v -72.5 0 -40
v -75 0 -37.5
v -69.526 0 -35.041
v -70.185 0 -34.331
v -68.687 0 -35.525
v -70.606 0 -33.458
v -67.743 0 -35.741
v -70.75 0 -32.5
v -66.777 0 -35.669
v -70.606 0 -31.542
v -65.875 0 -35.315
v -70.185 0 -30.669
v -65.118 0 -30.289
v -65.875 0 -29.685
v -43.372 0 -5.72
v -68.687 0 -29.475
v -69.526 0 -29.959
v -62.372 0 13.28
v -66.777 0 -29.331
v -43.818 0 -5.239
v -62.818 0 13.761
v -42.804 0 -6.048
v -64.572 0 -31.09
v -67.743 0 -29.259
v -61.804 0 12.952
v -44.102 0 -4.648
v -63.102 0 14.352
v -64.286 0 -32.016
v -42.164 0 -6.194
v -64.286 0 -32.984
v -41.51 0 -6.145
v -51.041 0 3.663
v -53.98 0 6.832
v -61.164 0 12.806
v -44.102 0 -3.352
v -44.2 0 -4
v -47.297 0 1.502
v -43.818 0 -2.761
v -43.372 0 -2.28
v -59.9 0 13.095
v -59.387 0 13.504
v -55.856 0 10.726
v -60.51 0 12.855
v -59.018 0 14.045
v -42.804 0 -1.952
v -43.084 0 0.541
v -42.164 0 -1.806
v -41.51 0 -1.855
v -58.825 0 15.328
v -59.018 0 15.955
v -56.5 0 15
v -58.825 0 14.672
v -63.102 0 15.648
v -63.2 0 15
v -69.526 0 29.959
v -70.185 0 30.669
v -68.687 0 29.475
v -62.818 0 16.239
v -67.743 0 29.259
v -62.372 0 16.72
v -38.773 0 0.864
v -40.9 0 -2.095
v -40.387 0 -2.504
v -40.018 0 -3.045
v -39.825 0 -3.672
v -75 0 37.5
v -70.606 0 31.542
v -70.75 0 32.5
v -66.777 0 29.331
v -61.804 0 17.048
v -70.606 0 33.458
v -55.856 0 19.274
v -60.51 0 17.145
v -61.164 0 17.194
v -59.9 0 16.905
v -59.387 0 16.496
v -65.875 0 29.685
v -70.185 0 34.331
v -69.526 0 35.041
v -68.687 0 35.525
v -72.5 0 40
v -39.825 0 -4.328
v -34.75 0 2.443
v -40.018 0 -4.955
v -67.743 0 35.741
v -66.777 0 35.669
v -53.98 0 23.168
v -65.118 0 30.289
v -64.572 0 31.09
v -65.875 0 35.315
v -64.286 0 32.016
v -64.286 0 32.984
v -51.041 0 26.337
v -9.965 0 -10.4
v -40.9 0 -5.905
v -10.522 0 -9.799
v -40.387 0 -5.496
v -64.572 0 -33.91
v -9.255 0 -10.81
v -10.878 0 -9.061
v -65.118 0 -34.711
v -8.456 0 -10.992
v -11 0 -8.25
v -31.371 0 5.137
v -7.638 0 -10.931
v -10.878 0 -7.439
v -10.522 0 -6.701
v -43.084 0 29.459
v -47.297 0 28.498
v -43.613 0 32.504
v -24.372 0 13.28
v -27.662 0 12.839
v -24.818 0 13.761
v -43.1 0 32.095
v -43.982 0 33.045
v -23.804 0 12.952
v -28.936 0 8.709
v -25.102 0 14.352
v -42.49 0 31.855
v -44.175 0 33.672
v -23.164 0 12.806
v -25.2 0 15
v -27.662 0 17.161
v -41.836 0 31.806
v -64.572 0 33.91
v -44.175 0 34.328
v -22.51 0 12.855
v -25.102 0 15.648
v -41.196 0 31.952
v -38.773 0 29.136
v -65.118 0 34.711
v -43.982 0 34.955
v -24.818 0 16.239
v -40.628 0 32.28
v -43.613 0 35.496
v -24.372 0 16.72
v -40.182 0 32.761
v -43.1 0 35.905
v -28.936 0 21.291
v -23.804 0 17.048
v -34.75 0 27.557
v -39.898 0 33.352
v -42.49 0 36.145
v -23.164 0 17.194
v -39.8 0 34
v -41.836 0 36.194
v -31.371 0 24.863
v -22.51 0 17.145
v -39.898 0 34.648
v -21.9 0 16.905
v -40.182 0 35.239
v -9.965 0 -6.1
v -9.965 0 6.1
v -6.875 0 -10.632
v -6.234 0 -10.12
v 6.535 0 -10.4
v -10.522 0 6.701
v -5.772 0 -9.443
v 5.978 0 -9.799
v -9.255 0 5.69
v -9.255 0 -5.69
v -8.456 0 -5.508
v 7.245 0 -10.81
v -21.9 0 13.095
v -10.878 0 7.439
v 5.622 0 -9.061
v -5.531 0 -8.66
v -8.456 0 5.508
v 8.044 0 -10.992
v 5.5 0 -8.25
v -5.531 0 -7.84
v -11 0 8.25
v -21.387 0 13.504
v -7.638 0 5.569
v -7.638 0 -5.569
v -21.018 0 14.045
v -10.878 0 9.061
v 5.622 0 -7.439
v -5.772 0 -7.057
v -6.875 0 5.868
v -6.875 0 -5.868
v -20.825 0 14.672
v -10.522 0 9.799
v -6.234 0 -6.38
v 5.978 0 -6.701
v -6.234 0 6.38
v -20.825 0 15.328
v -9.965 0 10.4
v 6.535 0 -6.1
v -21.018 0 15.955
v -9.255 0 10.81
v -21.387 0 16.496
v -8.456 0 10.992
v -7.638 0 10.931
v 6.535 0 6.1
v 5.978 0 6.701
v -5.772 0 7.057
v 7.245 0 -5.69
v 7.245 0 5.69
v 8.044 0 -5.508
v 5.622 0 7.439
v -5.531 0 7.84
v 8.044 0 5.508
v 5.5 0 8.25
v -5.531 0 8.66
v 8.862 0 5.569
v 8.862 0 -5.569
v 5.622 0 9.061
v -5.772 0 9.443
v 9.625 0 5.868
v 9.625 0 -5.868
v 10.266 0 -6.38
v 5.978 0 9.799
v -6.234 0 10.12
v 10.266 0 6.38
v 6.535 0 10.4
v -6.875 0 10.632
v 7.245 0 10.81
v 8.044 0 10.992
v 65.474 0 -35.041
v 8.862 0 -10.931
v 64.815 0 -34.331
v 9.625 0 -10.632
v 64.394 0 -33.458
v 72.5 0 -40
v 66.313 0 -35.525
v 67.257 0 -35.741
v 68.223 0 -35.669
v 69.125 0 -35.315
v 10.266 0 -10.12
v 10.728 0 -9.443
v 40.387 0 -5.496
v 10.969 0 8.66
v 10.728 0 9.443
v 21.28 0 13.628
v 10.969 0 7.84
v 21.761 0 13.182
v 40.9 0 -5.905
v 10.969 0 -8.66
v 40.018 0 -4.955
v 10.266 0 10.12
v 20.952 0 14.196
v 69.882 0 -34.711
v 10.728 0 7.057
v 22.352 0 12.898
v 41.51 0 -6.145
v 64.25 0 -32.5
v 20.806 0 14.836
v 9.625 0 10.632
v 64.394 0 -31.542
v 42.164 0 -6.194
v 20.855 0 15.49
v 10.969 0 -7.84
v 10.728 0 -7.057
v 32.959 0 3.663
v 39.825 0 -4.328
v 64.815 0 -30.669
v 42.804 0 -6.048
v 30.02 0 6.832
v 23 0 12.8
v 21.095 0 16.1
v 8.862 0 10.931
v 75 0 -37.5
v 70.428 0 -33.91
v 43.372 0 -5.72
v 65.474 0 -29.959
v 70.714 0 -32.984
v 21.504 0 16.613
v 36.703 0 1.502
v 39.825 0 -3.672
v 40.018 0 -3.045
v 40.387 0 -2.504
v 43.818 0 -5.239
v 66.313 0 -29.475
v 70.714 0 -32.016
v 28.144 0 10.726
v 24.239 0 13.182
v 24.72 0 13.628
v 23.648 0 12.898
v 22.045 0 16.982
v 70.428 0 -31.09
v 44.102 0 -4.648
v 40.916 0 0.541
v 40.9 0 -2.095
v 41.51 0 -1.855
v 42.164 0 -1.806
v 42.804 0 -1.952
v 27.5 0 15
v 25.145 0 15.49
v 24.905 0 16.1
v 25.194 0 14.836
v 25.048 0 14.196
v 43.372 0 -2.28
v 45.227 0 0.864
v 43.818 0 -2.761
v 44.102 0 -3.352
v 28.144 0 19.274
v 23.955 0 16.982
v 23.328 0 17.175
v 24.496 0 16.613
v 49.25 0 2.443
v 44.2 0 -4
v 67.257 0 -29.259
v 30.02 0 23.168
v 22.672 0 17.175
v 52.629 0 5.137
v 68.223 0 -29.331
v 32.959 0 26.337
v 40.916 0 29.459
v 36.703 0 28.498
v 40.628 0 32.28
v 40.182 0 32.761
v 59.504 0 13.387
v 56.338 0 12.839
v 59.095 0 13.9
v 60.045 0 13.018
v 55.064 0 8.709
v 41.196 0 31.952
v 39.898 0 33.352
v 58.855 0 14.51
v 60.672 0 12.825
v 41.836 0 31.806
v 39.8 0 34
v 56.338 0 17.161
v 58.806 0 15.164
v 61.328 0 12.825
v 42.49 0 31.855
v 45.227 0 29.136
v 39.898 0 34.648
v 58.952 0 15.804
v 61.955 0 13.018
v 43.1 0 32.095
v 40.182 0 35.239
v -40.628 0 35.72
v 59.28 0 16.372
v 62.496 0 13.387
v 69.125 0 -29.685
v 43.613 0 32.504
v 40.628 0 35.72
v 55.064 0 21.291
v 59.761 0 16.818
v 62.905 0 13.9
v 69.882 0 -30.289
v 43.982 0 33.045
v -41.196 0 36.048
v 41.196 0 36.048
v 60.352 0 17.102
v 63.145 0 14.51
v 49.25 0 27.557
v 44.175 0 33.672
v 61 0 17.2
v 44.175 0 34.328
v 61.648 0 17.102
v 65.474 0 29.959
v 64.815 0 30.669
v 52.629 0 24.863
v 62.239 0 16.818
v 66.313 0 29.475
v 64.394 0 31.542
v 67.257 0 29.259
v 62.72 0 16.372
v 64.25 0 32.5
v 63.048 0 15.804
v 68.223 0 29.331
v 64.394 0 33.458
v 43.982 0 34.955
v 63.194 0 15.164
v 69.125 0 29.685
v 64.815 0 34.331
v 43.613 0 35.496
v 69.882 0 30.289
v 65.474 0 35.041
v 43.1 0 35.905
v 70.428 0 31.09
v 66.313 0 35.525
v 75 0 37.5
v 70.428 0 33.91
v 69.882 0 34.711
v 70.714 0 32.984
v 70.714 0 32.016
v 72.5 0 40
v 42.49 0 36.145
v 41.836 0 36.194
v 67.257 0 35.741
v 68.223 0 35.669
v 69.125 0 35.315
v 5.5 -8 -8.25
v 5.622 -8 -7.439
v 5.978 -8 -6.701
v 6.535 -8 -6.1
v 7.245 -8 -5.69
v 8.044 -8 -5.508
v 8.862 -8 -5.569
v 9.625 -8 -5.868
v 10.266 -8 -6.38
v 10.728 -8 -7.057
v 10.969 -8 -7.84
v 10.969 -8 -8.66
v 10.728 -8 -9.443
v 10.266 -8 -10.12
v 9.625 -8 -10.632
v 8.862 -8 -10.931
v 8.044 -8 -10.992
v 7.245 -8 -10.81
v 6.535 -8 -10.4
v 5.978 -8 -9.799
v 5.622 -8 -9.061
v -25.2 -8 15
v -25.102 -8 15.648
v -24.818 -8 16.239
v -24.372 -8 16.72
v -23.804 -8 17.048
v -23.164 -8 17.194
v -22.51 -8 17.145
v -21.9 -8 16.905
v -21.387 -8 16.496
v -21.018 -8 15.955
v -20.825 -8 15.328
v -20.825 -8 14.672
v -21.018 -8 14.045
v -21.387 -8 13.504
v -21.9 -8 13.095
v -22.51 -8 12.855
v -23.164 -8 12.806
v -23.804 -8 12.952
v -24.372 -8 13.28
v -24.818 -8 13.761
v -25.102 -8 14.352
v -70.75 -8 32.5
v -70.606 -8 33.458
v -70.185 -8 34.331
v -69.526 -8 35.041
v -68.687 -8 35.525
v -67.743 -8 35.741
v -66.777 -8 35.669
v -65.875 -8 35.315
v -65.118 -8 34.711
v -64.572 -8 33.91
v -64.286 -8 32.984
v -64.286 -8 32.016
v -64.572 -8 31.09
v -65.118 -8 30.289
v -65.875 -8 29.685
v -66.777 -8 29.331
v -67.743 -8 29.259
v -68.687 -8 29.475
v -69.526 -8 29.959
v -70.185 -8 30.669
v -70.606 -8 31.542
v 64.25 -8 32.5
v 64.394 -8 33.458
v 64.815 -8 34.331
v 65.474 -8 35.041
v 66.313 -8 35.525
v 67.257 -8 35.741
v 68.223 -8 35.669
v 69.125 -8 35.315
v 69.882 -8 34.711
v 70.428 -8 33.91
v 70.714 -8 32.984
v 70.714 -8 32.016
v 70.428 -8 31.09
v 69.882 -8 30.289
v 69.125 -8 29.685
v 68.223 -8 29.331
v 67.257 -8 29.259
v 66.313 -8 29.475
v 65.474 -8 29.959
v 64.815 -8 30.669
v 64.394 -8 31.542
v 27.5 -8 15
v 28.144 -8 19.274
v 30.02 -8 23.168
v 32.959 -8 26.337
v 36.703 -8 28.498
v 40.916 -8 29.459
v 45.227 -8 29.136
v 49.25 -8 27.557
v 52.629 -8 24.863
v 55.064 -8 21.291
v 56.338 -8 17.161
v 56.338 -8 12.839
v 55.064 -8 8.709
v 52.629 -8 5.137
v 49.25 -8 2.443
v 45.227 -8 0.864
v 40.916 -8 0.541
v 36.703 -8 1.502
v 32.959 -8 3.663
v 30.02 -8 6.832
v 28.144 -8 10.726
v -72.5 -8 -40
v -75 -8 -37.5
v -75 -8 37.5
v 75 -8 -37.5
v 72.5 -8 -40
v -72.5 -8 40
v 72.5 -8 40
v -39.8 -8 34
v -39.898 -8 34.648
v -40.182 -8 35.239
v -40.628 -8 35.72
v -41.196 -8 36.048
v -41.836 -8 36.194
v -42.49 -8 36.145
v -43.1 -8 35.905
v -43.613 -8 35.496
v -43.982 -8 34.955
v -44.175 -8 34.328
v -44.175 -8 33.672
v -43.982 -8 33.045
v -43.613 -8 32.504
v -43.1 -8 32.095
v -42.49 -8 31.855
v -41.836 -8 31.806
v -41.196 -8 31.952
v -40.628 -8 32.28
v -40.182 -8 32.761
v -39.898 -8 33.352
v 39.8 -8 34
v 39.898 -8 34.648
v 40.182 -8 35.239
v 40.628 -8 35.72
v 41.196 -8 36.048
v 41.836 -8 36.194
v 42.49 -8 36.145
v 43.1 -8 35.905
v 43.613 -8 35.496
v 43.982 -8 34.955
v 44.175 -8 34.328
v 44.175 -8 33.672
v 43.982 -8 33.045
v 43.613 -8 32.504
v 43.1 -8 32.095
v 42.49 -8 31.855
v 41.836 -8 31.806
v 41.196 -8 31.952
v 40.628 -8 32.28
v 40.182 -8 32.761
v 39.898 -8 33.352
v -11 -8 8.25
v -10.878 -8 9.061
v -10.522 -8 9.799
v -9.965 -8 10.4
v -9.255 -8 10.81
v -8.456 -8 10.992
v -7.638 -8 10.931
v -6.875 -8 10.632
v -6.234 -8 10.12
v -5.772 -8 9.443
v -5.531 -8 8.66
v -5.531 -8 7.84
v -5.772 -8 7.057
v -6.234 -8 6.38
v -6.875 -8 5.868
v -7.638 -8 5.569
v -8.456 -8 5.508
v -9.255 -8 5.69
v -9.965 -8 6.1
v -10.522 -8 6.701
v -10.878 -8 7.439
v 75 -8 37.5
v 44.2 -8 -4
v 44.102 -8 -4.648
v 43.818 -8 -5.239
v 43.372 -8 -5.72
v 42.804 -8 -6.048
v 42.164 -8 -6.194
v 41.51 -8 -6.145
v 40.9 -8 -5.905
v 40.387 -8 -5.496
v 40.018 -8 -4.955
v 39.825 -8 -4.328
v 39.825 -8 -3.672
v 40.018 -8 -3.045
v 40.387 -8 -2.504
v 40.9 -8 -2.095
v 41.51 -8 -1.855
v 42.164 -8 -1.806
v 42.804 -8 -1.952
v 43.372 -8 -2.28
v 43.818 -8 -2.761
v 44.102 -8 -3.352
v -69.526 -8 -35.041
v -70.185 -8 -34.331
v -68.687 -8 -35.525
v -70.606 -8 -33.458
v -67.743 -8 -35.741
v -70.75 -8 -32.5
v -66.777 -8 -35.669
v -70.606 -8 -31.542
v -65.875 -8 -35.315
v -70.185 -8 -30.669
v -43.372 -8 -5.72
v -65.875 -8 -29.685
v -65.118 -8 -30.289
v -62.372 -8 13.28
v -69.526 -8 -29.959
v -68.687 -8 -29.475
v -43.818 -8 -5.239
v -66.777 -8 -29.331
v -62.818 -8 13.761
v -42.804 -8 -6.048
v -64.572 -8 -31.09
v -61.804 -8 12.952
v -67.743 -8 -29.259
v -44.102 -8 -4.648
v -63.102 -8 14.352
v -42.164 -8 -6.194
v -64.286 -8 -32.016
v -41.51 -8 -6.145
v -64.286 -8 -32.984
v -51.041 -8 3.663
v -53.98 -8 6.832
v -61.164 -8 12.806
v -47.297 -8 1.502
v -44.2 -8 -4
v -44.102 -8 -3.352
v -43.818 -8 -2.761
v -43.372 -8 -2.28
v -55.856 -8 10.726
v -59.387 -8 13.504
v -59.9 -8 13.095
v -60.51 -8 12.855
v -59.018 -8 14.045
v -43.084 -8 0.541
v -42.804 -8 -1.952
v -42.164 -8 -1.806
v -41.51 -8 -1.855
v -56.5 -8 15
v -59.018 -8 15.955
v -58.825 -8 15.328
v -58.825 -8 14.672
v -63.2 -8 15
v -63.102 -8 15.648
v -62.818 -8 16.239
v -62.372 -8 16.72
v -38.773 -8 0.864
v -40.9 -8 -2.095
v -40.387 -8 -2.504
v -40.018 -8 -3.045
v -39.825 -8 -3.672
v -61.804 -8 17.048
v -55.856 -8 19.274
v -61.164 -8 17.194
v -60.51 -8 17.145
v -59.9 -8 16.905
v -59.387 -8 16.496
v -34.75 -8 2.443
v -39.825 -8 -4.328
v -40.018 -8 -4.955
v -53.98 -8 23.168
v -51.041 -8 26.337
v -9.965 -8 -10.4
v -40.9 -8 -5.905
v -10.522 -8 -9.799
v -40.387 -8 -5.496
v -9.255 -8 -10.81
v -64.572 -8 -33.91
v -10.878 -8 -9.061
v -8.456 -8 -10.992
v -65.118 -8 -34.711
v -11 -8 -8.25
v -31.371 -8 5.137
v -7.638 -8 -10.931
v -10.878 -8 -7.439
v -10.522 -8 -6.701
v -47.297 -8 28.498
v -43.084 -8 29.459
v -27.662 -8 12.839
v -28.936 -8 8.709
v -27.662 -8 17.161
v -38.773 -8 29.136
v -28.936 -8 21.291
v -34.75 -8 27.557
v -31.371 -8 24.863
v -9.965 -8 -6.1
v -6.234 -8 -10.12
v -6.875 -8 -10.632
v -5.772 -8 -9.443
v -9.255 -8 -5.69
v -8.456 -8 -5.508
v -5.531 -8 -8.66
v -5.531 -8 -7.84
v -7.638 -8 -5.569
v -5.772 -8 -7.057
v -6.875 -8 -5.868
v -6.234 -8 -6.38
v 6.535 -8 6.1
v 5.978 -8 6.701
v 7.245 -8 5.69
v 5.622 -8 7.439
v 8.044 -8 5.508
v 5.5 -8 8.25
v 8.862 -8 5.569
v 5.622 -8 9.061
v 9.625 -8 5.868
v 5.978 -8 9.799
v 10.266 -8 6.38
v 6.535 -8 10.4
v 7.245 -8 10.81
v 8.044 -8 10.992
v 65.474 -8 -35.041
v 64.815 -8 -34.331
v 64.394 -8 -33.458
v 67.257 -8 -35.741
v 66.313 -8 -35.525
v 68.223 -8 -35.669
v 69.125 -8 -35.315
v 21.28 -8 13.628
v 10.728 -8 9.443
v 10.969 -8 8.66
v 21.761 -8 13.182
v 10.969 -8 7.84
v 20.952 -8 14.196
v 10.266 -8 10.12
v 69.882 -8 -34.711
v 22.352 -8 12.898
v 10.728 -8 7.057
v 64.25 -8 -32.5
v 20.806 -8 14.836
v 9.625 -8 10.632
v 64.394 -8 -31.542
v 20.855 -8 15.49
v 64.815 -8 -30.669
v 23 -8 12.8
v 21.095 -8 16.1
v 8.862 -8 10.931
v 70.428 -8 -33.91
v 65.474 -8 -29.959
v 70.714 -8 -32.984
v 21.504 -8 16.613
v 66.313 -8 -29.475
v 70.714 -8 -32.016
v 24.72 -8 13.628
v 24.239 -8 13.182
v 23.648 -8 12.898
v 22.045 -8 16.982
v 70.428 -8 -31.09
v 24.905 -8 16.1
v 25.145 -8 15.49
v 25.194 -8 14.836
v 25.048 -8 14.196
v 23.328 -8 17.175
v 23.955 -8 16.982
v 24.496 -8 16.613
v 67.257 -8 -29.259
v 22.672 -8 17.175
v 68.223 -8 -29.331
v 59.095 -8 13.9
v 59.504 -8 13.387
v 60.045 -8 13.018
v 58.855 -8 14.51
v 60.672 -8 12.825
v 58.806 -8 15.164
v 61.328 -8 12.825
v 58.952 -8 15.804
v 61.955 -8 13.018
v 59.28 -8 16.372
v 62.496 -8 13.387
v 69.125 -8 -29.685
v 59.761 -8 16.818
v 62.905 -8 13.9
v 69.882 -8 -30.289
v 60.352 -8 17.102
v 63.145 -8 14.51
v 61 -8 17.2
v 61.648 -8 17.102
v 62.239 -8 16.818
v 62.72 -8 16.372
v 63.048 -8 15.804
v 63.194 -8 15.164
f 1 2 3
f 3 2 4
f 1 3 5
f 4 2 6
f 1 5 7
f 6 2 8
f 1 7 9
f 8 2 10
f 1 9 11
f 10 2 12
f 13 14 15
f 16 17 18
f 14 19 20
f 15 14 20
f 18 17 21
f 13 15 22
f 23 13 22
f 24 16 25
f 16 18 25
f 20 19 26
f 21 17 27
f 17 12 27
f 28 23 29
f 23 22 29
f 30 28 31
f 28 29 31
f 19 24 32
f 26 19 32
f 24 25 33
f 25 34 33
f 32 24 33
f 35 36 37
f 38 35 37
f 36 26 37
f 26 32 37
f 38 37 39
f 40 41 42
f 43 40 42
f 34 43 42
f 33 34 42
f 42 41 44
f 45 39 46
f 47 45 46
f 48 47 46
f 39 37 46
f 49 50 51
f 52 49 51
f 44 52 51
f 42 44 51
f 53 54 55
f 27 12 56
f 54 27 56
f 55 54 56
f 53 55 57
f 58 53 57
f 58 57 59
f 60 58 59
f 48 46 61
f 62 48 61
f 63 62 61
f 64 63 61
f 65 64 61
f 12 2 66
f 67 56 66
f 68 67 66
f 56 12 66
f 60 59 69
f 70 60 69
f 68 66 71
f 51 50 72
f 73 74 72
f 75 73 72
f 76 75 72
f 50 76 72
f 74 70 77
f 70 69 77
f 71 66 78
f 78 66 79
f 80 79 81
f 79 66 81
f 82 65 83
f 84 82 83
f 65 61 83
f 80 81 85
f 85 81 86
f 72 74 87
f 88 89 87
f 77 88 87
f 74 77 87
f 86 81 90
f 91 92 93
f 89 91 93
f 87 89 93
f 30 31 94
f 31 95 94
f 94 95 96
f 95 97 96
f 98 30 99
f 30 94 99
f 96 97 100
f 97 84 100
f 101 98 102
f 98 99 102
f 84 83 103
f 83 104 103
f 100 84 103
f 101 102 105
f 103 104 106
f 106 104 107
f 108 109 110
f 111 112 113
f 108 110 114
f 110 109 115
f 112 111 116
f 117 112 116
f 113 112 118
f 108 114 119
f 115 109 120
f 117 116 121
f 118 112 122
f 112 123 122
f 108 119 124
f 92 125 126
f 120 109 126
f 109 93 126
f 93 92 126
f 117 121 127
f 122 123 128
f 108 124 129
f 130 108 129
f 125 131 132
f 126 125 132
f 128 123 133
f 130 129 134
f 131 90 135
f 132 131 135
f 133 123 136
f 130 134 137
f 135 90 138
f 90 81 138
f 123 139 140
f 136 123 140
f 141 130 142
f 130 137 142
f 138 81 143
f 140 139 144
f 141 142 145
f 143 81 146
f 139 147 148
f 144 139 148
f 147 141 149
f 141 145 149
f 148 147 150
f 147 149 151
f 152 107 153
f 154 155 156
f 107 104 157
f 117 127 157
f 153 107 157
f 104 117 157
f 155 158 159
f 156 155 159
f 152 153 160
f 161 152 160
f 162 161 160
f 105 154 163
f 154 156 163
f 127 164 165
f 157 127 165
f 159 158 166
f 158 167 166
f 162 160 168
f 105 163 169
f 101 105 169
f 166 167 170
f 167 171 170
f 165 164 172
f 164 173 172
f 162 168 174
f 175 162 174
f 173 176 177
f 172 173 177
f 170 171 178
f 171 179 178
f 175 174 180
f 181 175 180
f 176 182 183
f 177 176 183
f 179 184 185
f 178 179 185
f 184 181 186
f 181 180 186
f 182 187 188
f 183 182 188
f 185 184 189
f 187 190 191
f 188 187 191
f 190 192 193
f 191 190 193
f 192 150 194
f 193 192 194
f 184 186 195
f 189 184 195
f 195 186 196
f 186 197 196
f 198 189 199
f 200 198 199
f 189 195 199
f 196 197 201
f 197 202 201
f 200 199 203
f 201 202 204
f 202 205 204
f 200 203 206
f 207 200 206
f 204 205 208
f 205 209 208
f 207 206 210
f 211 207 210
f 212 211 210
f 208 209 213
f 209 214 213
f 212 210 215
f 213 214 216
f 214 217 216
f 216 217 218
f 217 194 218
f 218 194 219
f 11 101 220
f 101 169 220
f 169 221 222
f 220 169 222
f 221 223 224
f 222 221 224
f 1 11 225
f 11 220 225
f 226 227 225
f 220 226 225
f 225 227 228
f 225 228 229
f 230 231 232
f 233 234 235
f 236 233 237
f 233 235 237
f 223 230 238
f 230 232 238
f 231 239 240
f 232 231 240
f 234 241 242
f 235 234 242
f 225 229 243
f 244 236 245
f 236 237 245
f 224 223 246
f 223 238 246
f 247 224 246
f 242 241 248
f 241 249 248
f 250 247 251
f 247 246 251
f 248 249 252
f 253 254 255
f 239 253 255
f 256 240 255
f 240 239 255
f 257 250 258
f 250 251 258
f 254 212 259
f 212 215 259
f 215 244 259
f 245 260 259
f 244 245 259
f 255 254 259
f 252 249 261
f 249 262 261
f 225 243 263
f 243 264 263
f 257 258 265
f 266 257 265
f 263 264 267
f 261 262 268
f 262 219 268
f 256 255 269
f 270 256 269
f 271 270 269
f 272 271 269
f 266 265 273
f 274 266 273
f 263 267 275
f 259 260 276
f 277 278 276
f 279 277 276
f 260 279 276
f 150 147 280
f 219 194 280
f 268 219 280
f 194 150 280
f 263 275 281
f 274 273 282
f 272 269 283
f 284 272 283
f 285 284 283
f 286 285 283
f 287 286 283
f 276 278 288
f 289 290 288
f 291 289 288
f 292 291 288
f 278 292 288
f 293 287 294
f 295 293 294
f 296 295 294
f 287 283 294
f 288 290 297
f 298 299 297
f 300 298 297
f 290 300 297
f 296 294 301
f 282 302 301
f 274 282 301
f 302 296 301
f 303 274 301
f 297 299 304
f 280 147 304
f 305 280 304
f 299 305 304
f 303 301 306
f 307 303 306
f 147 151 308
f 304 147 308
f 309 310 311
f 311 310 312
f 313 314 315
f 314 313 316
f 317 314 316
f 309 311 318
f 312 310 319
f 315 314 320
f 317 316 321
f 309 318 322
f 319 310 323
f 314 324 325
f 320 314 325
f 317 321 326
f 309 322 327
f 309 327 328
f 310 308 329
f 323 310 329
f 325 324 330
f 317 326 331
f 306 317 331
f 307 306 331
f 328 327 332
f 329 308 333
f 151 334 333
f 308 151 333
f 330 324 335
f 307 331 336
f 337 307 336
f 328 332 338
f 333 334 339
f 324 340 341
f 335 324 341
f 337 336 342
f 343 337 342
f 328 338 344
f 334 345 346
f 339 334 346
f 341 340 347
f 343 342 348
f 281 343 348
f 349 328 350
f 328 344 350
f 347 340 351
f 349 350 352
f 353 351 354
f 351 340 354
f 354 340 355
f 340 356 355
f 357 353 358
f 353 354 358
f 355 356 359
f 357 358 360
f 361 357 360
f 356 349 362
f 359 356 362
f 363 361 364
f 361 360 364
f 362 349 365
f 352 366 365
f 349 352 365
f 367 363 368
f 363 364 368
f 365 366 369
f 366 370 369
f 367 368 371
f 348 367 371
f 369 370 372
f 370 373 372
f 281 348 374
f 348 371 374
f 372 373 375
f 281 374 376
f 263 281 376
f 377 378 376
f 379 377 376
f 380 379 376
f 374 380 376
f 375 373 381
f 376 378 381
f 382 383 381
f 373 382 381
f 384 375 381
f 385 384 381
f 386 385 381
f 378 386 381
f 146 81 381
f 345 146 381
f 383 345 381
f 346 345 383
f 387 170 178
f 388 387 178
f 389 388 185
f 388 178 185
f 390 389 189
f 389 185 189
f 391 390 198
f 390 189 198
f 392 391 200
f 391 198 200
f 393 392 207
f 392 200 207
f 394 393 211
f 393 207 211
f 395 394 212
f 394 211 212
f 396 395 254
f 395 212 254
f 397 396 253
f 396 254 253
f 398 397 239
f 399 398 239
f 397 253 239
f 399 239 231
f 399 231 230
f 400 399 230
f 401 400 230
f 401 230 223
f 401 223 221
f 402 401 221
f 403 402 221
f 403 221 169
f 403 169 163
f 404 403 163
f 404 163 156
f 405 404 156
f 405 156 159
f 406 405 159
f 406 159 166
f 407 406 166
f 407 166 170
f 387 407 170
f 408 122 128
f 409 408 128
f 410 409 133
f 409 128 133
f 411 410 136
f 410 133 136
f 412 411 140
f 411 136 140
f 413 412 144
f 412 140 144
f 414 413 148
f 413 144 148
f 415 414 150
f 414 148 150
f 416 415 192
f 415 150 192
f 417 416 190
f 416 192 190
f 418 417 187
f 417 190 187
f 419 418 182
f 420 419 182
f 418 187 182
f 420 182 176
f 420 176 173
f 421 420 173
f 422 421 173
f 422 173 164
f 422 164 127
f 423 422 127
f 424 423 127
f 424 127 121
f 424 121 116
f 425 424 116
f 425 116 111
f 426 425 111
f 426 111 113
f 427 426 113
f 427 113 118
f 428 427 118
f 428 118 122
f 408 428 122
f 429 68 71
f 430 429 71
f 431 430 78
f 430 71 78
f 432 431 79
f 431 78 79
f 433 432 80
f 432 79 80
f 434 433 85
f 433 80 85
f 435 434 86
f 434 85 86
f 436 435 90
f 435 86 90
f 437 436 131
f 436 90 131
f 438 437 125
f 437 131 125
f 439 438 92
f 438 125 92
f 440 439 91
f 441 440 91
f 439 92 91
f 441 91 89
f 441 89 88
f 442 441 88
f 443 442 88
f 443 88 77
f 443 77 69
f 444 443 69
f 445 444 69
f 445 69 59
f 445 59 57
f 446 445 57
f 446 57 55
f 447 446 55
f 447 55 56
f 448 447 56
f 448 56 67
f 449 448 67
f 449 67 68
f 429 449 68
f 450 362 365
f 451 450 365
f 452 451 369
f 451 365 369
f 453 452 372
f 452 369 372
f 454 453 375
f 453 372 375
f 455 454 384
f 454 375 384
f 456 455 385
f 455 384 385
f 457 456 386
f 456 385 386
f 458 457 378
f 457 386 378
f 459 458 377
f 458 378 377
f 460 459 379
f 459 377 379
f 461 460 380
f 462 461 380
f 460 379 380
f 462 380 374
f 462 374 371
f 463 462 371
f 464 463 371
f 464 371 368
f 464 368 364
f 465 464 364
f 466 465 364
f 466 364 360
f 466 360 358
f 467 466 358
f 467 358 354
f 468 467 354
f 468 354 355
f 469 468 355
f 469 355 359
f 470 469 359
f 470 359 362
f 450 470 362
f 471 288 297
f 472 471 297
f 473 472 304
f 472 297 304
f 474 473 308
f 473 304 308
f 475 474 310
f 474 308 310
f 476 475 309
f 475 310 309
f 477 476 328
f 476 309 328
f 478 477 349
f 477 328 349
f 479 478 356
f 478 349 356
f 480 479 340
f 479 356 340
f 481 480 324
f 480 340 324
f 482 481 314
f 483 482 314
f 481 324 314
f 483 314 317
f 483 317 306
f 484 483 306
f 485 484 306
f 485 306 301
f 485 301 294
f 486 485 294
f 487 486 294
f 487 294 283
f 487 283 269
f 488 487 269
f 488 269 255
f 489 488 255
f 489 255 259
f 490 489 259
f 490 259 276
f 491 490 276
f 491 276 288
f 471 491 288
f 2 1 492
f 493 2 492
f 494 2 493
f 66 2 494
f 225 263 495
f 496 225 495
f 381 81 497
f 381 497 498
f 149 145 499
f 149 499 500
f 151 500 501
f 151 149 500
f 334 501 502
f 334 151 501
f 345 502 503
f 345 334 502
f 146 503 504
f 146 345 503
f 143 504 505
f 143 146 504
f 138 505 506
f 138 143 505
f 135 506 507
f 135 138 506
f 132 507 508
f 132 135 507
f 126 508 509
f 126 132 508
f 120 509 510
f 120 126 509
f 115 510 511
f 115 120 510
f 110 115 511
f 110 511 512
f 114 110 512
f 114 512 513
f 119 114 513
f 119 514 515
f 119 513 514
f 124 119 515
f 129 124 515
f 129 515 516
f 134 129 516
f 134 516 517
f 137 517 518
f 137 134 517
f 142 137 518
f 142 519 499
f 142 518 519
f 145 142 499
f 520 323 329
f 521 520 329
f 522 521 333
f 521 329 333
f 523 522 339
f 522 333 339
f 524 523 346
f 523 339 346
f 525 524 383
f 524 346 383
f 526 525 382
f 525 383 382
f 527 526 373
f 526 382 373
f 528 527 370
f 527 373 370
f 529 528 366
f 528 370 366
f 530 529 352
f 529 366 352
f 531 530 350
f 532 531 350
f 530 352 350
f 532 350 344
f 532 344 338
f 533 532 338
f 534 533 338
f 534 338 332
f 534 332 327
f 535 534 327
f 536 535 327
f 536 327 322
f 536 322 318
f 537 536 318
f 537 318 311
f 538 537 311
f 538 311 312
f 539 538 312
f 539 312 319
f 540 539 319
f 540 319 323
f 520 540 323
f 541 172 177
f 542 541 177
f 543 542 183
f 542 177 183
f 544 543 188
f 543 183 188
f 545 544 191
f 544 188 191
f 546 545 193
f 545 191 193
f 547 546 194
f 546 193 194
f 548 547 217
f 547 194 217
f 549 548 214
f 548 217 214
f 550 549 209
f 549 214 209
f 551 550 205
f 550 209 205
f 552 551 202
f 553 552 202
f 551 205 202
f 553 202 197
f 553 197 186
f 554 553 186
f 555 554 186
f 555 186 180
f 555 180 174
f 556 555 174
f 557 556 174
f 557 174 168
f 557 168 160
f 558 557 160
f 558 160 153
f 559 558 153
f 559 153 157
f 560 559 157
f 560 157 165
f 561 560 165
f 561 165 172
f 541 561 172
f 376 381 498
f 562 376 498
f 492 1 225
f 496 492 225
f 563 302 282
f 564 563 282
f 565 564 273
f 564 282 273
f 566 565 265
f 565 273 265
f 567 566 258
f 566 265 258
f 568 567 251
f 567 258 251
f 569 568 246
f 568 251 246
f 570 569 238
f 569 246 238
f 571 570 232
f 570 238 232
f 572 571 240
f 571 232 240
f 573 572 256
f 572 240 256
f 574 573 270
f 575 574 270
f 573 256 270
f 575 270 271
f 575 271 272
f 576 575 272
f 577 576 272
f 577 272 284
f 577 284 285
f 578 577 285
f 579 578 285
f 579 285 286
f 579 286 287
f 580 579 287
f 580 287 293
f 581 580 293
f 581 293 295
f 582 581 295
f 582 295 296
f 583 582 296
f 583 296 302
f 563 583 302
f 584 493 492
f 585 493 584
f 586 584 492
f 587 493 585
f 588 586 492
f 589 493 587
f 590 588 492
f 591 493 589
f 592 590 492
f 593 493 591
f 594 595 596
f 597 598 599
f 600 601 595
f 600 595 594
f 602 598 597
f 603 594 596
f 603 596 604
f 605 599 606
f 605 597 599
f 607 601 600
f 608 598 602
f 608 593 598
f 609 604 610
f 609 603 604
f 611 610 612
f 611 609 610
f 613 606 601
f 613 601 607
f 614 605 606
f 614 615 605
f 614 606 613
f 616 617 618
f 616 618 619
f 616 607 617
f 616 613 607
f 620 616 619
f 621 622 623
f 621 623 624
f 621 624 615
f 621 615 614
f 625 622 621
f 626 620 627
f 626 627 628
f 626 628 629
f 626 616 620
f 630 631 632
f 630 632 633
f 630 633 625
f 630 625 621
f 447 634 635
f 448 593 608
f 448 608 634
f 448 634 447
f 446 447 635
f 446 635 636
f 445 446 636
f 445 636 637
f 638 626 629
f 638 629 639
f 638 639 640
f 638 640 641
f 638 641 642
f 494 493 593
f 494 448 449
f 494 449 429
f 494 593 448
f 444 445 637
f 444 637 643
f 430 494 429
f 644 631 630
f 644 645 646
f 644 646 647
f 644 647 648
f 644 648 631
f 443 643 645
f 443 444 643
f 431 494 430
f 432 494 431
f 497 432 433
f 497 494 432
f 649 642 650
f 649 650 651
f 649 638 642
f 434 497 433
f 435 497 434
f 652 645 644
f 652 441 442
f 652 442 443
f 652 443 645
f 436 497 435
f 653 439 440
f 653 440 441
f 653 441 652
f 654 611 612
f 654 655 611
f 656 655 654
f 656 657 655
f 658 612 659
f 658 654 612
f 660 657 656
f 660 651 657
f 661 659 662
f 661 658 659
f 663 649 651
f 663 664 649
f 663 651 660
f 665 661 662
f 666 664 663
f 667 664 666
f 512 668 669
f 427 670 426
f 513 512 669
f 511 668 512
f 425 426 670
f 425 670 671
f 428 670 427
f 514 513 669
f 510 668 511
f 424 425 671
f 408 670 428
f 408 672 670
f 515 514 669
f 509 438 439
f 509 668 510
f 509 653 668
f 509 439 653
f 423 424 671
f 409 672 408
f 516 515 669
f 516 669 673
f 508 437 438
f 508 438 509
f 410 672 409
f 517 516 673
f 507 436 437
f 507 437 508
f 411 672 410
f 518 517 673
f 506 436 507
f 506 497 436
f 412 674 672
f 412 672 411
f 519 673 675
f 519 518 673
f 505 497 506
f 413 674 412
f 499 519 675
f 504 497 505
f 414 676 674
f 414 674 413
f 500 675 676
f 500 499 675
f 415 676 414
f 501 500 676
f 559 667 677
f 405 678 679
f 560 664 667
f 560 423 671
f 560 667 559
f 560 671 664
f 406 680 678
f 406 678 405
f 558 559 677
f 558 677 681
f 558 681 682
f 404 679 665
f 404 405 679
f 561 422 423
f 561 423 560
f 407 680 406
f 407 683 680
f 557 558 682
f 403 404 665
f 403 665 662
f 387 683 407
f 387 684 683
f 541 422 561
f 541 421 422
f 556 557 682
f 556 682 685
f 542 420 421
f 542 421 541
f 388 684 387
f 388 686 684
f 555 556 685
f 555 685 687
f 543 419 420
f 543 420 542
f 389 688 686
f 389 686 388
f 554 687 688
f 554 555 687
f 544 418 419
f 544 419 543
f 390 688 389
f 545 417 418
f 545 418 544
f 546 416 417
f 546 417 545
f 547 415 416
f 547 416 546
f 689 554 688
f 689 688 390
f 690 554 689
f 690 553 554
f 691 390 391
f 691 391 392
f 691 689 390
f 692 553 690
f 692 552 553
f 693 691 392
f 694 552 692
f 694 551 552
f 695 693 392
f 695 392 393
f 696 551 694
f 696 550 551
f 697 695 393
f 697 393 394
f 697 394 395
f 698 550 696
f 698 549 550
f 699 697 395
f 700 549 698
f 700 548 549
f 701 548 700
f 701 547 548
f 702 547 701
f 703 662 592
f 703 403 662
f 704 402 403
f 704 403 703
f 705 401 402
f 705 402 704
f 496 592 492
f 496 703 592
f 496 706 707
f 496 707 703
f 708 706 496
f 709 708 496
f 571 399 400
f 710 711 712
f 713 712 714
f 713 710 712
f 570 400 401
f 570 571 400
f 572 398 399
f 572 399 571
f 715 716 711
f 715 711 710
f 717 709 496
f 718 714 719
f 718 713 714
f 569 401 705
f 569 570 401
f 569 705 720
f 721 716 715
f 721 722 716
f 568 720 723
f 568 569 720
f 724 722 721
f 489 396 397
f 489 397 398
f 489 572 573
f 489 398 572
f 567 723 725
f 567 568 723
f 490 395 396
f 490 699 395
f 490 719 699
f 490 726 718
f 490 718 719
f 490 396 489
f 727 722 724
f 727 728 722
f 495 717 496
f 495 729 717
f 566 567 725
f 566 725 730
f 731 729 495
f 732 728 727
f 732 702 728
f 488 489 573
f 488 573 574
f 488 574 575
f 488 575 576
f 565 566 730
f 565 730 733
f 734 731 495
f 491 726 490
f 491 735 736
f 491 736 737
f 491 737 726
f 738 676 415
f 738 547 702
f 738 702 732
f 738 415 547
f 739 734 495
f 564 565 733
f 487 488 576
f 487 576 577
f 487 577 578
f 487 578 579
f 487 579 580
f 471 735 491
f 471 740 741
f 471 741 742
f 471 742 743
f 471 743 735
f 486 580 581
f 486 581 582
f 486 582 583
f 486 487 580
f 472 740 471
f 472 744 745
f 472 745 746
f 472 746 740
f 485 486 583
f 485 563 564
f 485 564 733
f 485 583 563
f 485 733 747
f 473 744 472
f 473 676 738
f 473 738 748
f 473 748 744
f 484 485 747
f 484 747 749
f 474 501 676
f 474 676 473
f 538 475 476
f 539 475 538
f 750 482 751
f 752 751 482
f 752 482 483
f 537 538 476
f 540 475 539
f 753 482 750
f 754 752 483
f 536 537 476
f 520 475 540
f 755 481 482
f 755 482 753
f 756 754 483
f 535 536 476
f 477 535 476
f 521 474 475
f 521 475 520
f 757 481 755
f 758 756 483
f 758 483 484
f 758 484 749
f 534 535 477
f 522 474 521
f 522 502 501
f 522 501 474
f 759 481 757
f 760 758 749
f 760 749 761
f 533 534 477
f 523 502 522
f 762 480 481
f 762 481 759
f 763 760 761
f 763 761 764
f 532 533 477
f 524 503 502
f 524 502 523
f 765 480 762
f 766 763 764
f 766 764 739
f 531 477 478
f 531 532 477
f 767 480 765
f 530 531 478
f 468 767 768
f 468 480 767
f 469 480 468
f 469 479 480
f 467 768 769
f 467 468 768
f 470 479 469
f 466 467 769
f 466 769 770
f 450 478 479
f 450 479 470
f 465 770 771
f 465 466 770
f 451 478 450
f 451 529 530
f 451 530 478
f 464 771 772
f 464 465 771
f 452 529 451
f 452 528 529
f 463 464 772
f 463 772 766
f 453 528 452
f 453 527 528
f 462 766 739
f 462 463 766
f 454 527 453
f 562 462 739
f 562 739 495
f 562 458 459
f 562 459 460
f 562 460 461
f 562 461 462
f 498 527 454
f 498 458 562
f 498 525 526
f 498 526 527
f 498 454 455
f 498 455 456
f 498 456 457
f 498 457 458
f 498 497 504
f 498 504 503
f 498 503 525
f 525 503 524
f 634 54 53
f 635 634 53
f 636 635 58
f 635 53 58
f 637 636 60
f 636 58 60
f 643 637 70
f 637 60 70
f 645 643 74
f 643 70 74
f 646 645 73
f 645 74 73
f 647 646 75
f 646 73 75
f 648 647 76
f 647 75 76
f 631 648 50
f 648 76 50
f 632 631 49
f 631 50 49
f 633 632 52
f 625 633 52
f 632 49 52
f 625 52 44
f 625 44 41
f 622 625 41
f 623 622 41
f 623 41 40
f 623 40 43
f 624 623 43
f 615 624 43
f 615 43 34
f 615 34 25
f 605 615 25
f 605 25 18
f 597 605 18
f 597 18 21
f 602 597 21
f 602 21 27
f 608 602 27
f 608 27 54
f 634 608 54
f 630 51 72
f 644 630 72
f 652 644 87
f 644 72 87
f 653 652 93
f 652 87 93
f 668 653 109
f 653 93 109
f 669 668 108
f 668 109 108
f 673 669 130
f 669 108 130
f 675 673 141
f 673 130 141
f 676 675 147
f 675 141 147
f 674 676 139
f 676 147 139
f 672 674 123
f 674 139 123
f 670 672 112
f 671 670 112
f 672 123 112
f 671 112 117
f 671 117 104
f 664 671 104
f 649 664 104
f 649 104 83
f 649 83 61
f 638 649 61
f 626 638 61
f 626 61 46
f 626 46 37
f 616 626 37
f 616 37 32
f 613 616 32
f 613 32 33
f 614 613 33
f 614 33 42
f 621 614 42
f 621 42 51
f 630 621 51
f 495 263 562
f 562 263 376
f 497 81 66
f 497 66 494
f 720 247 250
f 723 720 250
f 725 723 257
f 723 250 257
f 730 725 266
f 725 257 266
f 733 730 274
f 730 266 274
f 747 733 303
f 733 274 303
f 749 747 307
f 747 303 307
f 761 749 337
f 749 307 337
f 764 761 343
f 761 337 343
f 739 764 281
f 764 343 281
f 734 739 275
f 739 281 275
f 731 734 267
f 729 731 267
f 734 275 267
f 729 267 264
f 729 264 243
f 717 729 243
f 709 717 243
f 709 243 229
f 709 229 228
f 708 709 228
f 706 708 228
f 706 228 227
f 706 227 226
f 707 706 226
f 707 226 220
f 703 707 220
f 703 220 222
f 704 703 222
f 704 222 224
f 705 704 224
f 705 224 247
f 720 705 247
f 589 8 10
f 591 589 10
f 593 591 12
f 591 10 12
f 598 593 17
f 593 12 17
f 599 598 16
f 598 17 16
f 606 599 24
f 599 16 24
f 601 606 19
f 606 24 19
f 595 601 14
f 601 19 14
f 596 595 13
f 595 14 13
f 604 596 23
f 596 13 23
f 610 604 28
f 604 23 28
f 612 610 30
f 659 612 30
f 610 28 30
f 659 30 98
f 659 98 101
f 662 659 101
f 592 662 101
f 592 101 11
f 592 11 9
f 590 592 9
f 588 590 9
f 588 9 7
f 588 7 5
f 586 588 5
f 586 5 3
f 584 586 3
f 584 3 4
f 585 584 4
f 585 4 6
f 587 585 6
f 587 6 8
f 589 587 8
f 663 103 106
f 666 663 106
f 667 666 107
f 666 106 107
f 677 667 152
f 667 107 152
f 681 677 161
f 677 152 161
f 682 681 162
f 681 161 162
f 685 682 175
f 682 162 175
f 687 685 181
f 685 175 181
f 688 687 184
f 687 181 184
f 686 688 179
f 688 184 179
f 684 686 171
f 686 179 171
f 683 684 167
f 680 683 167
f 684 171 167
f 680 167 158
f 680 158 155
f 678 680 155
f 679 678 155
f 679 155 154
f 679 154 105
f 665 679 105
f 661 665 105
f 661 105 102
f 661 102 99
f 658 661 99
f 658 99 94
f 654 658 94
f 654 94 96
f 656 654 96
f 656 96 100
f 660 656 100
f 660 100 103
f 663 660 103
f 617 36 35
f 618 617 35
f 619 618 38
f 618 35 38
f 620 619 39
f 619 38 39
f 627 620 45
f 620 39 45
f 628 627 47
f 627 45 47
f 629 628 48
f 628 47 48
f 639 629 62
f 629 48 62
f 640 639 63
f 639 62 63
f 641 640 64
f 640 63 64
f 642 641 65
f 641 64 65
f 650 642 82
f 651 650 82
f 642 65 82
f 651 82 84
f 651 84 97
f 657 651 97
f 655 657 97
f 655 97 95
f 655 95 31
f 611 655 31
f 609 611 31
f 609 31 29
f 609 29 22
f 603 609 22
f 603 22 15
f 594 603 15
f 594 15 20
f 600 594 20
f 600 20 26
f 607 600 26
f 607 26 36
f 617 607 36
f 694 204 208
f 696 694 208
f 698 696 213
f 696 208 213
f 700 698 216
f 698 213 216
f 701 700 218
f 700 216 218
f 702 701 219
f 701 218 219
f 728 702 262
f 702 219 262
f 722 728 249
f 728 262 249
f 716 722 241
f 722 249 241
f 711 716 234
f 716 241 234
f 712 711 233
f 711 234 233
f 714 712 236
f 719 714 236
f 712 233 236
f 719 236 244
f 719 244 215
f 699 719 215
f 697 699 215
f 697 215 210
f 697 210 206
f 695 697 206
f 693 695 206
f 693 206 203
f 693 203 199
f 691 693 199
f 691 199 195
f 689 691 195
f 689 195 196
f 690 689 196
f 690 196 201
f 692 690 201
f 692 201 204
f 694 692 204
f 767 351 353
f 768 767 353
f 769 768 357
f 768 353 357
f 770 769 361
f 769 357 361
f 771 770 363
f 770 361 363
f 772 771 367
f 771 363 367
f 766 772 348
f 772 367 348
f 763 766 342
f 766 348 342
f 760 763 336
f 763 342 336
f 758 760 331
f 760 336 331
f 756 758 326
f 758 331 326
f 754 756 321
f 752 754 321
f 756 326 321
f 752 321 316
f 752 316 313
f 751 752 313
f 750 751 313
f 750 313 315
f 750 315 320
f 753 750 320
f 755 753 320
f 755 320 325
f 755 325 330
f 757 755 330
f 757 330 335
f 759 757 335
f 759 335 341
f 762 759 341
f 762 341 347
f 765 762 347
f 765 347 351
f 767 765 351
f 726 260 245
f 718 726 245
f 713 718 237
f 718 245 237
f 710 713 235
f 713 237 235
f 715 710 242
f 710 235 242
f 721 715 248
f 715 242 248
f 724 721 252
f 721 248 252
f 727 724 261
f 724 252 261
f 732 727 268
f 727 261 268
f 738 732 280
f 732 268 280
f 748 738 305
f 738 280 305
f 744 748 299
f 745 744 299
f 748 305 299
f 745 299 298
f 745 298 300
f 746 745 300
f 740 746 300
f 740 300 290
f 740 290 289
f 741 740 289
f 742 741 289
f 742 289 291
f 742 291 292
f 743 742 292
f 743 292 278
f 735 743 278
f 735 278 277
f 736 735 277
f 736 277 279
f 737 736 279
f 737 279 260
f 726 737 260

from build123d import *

# Parameters (mm, degrees)
F0_W             = 150
F0_H             = 80
F1_DEPTH         = 8
F2_SIZE          = 2.5
F4_D             = 4.4
F4_COPIES_COUNT  = 4
F4_COPIES2_COUNT = 2
F4_COPIES2_PITCH = 104.737768
F4_COPIES3_COUNT = 2
F4_COPIES3_PITCH = 92.195445
F4_COPIES4_COUNT = 2
F4_COPIES4_PITCH = 67.720012
F5_D             = 6.5
F6_D             = 5.5
F7_D             = 29


# Not quite as in the source:
# - a pattern or mirror of a feature is missing from the dataset's text; its kind, count and spacing are read off the source's solid


with BuildPart() as f1:
    # F0 (on Front) → F1 (new body)
    with BuildSketch(Plane.XZ):
        Rectangle(F0_W, F0_H)
    extrude(amount=F1_DEPTH)

    # F2
    f2_edges = [f1.edges().sort_by_distance(p)[0] for p in [
        (75, -4, 40),
        (75, -4, -40),
        (-75, -4, 40),
        (-75, -4, -40),
    ]]
    chamfer(f2_edges, length=F2_SIZE)

    # F4 (through all)
    with Locations(Plane.XZ.offset(8)):
        with Locations((42, 34)):
            f4 = Hole(F4_D / 2)

    # F4_copies: F4 ×4 about axis
    f4_copies_axis = Axis((42, 0, 15), (0, 1, 0))
    for i in range(1, F4_COPIES_COUNT):
        add(f4.rotate(f4_copies_axis, i * 360 / F4_COPIES_COUNT), mode=Mode.SUBTRACT)

    # F4_copies1: F4 across plane
    add(f4.mirror(Plane(origin=(0, 0, 0), x_dir=(0, 0, -1), z_dir=(-1, 0, 0))), mode=Mode.SUBTRACT)

    # F4_copies2: F4 ×2
    with Locations(*[Vector(-0.9834083939, 0, -0.1814054319) * (i * F4_COPIES2_PITCH) for i in range(1, F4_COPIES2_COUNT)]):
        add(f4, mode=Mode.SUBTRACT)

    # F4_copies3: F4 ×2
    with Locations(*[Vector(-0.9111079228, 0, -0.4121678699) * (i * F4_COPIES3_PITCH) for i in range(1, F4_COPIES3_COUNT)]):
        add(f4, mode=Mode.SUBTRACT)

    # F4_copies4: F4 ×2
    with Locations(*[Vector(-0.9598344457, 0, -0.2805669918) * (i * F4_COPIES4_PITCH) for i in range(1, F4_COPIES4_COUNT)]):
        add(f4, mode=Mode.SUBTRACT)

    # F5 (through all)
    with Locations(Plane.XZ.offset(8)):
        with Locations((67.5, 32.5), (67.5, -32.5), (-67.5, -32.5), (-67.5, 32.5)):
            Hole(F5_D / 2)

    # F6 (through all)
    with Locations(Plane.XZ.offset(8)):
        with Locations((-8.25, -8.25), (8.25, -8.25), (8.25, 8.25), (-8.25, 8.25)):
            Hole(F6_D / 2)

    # F7 (through all)
    with Locations(Plane.XZ.offset(8)):
        with Locations((-42, 15), (42, 15)):
            Hole(F7_D / 2)


solid = f1.part
